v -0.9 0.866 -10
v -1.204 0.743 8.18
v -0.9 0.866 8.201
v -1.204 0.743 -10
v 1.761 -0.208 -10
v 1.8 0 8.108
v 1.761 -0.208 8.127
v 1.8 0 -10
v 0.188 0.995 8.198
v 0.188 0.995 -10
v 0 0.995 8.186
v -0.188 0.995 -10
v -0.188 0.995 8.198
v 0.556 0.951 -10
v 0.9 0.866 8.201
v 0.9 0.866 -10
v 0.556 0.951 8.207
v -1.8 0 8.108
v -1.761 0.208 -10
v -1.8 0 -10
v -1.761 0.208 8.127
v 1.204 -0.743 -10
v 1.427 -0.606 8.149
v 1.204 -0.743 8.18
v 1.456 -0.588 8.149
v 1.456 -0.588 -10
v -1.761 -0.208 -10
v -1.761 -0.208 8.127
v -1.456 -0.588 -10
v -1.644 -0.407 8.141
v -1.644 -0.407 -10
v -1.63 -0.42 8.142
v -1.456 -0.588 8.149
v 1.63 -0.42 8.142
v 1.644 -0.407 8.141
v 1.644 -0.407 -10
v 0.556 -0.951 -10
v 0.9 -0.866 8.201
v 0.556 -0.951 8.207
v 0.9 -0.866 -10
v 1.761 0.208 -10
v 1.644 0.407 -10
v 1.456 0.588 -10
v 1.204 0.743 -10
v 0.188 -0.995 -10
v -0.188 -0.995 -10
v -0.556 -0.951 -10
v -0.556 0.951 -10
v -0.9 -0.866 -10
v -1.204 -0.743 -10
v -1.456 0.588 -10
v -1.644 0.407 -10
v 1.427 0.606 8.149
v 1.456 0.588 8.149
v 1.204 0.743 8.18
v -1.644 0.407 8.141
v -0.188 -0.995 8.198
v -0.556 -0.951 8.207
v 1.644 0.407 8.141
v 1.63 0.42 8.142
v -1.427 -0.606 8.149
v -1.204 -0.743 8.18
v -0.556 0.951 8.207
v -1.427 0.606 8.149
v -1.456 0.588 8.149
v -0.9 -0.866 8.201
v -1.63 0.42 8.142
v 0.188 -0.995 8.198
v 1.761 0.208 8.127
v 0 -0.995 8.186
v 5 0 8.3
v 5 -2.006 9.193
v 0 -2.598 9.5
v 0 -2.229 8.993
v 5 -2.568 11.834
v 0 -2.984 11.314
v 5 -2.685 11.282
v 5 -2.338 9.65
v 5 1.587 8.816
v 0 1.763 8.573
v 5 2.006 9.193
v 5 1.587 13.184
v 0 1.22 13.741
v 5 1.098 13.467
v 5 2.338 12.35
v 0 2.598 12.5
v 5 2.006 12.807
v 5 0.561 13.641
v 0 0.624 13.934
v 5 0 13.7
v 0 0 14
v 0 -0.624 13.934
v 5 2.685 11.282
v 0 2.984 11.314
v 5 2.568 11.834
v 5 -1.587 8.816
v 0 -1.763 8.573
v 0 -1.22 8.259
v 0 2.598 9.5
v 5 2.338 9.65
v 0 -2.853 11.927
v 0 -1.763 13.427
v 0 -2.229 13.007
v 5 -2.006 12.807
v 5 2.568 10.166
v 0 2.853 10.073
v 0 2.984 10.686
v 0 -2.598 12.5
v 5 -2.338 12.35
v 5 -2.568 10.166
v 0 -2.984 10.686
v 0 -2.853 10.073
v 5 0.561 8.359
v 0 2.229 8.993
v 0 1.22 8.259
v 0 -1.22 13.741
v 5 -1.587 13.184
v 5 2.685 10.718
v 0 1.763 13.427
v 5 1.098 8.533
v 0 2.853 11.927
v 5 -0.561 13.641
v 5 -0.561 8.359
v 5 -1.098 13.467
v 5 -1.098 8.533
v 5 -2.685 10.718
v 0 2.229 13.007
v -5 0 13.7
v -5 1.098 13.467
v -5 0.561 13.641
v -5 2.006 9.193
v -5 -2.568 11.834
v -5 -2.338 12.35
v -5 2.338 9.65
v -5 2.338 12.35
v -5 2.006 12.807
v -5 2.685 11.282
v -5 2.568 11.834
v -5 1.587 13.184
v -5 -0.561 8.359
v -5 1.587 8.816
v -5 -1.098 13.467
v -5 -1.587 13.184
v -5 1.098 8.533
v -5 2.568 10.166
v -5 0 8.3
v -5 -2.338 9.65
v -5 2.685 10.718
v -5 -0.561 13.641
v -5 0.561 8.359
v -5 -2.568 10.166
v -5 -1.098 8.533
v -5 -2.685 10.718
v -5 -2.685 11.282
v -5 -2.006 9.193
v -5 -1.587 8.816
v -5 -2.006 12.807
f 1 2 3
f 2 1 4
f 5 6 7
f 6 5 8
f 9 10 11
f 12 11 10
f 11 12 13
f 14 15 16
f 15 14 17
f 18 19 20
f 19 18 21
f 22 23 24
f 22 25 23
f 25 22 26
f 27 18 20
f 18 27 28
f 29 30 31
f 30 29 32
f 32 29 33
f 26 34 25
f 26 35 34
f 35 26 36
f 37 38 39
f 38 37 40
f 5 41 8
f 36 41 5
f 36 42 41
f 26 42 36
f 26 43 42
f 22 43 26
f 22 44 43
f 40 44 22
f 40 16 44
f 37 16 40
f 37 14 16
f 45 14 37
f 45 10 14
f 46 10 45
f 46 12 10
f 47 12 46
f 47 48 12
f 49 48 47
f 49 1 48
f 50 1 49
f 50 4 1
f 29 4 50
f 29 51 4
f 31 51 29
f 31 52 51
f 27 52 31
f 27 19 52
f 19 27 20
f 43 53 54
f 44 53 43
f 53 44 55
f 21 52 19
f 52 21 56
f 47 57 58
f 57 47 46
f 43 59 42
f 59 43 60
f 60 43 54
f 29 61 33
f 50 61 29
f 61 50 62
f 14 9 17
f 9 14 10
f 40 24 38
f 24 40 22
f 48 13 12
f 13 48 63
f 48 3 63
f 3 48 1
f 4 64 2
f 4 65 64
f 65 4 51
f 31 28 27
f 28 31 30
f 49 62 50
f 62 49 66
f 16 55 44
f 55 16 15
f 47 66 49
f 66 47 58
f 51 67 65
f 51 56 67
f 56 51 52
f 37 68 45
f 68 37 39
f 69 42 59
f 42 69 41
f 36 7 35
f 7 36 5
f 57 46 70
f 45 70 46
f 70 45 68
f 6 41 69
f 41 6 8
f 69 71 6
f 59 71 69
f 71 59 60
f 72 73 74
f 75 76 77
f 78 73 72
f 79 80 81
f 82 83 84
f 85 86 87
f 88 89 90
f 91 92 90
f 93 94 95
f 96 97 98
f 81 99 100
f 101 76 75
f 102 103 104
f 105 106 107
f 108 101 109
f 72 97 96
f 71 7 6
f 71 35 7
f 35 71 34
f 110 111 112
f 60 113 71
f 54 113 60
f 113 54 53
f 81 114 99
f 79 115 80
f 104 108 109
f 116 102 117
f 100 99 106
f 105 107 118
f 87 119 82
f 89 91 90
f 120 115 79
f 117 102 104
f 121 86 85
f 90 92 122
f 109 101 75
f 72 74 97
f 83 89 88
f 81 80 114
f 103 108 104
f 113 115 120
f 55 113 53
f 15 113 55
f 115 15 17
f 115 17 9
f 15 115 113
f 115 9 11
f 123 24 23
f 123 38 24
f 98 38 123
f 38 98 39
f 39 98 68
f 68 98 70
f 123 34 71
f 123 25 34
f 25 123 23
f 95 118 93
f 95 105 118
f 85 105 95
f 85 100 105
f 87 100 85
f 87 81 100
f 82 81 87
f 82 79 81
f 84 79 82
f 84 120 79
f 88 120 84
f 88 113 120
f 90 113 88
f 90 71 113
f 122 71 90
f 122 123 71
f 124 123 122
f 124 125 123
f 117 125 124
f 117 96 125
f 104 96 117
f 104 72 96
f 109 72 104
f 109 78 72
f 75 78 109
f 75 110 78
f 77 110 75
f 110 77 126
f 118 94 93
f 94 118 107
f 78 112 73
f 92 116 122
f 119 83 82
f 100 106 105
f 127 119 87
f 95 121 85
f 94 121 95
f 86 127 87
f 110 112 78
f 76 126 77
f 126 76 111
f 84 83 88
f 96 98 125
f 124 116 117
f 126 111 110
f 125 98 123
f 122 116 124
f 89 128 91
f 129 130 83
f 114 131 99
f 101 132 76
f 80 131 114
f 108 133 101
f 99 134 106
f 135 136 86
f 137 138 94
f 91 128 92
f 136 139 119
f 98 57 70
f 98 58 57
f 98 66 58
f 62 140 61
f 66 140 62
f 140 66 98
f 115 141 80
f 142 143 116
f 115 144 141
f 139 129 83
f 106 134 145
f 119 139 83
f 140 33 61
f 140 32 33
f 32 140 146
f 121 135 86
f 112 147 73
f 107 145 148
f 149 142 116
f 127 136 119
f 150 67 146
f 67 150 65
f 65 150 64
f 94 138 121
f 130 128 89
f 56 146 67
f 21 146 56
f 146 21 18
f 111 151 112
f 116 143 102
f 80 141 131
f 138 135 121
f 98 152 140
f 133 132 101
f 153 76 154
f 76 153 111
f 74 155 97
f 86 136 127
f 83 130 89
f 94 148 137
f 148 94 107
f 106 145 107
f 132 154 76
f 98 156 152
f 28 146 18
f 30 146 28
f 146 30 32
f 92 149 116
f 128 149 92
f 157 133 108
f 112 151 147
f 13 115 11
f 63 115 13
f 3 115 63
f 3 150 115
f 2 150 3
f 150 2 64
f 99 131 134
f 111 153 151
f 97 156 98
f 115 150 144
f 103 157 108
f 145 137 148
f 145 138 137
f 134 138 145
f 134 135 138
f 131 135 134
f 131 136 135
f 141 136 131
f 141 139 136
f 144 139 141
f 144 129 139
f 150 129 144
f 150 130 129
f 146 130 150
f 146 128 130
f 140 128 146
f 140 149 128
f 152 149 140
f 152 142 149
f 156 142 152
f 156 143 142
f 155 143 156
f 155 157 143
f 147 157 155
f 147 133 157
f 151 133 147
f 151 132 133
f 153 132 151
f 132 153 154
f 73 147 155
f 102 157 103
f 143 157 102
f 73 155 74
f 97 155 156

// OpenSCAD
module Mallet(){

    color("#cdaa7d"){
    linear_extrude(20, center =true){
    scale([1.8,1,1])
    circle( center =true, $fn= 30);
        }
    }
   
    color("#777777"){
    translate([0,0,11])
    rotate([0,90,0])
    cylinder(5,3,2.7, $fn = 30);
    }

    color("#777777"){
    translate([0,0,11])
    rotate([0,-90,0])
    cylinder(5,3,2.7, $fn = 30);
    }

}

Mallet();

// Written by Nicolì Angelo (Gengio) 2024: 
// MIT License

//Permission is hereby granted, free of charge, to any person obtaining a copy of this software and associated documentation files (the "Software"), to deal in the Software without restriction, including without limitation the rights to use, copy, modify, merge, publish, distribute, sublicense, and/or sell copies of the Software, and to permit persons to whom the Software is furnished to do so, subject to the following conditions:

//The above copyright notice and this permission notice shall be included in all copies or substantial portions of the Software.

//THE SOFTWARE IS PROVIDED "AS IS", WITHOUT WARRANTY OF ANY KIND, EXPRESS OR IMPLIED, INCLUDING BUT NOT LIMITED TO THE WARRANTIES OF MERCHANTABILITY, FITNESS FOR A PARTICULAR PURPOSE AND NONINFRINGEMENT. IN NO EVENT SHALL THE AUTHORS OR COPYRIGHT HOLDERS BE LIABLE FOR ANY CLAIM, DAMAGES OR OTHER LIABILITY, WHETHER IN AN ACTION OF CONTRACT, TORT OR OTHERWISE, ARISING FROM, OUT OF OR IN CONNECTION WITH THE SOFTWARE OR THE USE OR OTHER DEALINGS IN THE SOFTWARE.
